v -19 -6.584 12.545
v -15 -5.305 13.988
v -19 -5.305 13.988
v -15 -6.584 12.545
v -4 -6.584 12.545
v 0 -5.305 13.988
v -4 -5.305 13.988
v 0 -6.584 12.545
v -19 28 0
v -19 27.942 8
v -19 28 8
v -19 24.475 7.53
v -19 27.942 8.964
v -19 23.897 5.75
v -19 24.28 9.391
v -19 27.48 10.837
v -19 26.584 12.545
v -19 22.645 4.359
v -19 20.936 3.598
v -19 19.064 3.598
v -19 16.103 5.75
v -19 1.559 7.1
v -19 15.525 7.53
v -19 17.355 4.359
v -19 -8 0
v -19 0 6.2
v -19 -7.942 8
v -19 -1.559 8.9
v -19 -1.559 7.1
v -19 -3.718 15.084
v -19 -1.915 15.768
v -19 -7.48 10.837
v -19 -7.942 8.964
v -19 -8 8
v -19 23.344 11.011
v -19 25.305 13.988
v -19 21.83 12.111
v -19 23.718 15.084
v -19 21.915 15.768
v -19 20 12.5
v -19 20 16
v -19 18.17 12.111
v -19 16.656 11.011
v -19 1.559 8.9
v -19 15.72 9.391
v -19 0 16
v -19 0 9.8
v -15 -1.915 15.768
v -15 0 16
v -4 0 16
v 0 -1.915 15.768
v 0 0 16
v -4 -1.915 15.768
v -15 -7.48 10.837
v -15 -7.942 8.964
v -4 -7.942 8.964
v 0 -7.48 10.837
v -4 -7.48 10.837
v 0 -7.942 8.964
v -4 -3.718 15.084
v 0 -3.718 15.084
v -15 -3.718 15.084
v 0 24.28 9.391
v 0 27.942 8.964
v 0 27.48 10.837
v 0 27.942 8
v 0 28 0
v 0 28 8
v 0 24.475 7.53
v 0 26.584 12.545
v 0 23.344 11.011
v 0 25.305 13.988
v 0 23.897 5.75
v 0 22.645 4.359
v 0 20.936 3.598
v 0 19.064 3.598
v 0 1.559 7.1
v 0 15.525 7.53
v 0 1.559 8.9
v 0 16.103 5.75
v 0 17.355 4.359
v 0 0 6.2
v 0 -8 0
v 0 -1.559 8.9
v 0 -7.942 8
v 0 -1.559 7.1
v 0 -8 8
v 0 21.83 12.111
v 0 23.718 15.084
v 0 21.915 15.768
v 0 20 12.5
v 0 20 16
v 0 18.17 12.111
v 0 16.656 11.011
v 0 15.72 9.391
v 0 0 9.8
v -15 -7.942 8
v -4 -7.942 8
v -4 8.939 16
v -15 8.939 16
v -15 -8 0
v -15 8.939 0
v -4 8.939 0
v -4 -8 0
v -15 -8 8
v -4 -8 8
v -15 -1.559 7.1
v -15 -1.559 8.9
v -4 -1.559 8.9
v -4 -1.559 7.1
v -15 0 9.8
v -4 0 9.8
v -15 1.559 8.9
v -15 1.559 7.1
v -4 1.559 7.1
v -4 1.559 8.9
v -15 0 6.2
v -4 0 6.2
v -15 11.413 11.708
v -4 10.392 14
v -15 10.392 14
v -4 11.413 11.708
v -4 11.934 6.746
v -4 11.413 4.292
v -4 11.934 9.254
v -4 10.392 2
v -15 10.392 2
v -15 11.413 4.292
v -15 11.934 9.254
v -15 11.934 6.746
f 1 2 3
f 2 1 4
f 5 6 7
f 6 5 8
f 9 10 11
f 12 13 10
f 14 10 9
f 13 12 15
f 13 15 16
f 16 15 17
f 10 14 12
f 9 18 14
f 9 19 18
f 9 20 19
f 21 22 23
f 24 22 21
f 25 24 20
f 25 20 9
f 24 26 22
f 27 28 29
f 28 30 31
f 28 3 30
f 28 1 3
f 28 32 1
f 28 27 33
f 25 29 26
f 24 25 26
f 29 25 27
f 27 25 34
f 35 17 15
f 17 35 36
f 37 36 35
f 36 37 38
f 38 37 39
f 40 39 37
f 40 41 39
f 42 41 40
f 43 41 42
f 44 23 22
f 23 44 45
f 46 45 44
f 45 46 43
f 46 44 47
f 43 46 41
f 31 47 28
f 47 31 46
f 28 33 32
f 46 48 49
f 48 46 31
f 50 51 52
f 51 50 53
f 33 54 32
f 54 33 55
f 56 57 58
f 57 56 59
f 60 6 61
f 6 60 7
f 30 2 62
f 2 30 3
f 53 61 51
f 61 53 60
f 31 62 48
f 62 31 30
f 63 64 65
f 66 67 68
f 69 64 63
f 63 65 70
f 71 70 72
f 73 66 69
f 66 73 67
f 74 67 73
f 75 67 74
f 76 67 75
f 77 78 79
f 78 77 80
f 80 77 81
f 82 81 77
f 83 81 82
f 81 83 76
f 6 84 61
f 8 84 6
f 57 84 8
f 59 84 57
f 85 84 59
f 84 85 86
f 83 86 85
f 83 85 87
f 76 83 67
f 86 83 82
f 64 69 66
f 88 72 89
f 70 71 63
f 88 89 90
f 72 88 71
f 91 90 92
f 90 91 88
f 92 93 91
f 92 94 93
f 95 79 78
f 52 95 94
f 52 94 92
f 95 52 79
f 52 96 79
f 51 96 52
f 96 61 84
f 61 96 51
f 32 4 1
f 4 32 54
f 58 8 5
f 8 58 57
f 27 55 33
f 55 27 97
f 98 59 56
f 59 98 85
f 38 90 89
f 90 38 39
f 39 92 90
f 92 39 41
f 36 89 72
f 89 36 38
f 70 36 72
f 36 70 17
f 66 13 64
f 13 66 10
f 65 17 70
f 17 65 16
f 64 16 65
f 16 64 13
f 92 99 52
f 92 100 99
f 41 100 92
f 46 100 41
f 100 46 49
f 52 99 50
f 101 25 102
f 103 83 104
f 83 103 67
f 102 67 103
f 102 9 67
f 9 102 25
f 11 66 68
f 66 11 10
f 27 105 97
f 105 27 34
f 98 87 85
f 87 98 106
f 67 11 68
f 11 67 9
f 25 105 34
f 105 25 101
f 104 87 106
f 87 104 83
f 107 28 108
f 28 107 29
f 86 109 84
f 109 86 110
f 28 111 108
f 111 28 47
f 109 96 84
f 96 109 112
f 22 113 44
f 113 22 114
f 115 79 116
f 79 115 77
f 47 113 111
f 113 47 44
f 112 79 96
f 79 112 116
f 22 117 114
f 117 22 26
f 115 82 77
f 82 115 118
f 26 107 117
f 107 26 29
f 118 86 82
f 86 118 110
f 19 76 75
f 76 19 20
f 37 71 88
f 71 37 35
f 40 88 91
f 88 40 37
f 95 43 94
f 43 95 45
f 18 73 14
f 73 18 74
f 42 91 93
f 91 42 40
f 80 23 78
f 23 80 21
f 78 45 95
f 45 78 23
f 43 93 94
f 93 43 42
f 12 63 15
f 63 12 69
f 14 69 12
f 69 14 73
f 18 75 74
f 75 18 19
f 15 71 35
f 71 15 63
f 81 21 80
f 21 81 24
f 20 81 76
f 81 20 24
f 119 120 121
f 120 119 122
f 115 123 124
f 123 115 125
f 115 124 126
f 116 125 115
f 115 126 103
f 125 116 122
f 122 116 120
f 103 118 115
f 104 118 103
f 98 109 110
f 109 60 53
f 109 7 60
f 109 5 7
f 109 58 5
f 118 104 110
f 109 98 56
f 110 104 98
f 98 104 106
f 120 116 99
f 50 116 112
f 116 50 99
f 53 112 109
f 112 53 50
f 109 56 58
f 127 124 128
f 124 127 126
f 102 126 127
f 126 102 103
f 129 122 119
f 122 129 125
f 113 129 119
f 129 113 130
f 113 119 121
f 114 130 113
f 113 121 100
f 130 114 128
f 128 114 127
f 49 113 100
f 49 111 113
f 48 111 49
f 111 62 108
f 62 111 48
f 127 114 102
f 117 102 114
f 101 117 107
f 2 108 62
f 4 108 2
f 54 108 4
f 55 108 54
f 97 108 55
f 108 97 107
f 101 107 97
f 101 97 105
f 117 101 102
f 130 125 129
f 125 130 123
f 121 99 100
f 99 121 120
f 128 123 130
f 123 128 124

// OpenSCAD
// PRUSA iteration3
// Y idler
// GNU GPL v3
// Josef Průša <iam@josefprusa.cz> and contributors
// http://www.reprap.org/wiki/Prusa_Mendel
// http://prusamendel.org

module y_idler_base(){
    translate([0,0,0]) cylinder(h=19,r=8);
    translate([0,20,0]) cylinder(h=19,r=8);
    translate([0,10,9.5]) cube([16,20,19],center=true);
    translate([-4,10,9.5]) cube([8,16+20,19],center=true);
}

module y_idler_holes(){
    translate([0,0,-1]) cylinder(h=120,r=1.8);
    translate([0,20,-1]) cylinder(h=25,r=4.5);
    translate([0,0,4]) cylinder(h=11,r=12);
}

// Final part
module y_idler(){
    translate([0,0,8]) rotate([0,-90,0]) difference(){
        y_idler_base();
        y_idler_holes();
    }
}

y_idler();
